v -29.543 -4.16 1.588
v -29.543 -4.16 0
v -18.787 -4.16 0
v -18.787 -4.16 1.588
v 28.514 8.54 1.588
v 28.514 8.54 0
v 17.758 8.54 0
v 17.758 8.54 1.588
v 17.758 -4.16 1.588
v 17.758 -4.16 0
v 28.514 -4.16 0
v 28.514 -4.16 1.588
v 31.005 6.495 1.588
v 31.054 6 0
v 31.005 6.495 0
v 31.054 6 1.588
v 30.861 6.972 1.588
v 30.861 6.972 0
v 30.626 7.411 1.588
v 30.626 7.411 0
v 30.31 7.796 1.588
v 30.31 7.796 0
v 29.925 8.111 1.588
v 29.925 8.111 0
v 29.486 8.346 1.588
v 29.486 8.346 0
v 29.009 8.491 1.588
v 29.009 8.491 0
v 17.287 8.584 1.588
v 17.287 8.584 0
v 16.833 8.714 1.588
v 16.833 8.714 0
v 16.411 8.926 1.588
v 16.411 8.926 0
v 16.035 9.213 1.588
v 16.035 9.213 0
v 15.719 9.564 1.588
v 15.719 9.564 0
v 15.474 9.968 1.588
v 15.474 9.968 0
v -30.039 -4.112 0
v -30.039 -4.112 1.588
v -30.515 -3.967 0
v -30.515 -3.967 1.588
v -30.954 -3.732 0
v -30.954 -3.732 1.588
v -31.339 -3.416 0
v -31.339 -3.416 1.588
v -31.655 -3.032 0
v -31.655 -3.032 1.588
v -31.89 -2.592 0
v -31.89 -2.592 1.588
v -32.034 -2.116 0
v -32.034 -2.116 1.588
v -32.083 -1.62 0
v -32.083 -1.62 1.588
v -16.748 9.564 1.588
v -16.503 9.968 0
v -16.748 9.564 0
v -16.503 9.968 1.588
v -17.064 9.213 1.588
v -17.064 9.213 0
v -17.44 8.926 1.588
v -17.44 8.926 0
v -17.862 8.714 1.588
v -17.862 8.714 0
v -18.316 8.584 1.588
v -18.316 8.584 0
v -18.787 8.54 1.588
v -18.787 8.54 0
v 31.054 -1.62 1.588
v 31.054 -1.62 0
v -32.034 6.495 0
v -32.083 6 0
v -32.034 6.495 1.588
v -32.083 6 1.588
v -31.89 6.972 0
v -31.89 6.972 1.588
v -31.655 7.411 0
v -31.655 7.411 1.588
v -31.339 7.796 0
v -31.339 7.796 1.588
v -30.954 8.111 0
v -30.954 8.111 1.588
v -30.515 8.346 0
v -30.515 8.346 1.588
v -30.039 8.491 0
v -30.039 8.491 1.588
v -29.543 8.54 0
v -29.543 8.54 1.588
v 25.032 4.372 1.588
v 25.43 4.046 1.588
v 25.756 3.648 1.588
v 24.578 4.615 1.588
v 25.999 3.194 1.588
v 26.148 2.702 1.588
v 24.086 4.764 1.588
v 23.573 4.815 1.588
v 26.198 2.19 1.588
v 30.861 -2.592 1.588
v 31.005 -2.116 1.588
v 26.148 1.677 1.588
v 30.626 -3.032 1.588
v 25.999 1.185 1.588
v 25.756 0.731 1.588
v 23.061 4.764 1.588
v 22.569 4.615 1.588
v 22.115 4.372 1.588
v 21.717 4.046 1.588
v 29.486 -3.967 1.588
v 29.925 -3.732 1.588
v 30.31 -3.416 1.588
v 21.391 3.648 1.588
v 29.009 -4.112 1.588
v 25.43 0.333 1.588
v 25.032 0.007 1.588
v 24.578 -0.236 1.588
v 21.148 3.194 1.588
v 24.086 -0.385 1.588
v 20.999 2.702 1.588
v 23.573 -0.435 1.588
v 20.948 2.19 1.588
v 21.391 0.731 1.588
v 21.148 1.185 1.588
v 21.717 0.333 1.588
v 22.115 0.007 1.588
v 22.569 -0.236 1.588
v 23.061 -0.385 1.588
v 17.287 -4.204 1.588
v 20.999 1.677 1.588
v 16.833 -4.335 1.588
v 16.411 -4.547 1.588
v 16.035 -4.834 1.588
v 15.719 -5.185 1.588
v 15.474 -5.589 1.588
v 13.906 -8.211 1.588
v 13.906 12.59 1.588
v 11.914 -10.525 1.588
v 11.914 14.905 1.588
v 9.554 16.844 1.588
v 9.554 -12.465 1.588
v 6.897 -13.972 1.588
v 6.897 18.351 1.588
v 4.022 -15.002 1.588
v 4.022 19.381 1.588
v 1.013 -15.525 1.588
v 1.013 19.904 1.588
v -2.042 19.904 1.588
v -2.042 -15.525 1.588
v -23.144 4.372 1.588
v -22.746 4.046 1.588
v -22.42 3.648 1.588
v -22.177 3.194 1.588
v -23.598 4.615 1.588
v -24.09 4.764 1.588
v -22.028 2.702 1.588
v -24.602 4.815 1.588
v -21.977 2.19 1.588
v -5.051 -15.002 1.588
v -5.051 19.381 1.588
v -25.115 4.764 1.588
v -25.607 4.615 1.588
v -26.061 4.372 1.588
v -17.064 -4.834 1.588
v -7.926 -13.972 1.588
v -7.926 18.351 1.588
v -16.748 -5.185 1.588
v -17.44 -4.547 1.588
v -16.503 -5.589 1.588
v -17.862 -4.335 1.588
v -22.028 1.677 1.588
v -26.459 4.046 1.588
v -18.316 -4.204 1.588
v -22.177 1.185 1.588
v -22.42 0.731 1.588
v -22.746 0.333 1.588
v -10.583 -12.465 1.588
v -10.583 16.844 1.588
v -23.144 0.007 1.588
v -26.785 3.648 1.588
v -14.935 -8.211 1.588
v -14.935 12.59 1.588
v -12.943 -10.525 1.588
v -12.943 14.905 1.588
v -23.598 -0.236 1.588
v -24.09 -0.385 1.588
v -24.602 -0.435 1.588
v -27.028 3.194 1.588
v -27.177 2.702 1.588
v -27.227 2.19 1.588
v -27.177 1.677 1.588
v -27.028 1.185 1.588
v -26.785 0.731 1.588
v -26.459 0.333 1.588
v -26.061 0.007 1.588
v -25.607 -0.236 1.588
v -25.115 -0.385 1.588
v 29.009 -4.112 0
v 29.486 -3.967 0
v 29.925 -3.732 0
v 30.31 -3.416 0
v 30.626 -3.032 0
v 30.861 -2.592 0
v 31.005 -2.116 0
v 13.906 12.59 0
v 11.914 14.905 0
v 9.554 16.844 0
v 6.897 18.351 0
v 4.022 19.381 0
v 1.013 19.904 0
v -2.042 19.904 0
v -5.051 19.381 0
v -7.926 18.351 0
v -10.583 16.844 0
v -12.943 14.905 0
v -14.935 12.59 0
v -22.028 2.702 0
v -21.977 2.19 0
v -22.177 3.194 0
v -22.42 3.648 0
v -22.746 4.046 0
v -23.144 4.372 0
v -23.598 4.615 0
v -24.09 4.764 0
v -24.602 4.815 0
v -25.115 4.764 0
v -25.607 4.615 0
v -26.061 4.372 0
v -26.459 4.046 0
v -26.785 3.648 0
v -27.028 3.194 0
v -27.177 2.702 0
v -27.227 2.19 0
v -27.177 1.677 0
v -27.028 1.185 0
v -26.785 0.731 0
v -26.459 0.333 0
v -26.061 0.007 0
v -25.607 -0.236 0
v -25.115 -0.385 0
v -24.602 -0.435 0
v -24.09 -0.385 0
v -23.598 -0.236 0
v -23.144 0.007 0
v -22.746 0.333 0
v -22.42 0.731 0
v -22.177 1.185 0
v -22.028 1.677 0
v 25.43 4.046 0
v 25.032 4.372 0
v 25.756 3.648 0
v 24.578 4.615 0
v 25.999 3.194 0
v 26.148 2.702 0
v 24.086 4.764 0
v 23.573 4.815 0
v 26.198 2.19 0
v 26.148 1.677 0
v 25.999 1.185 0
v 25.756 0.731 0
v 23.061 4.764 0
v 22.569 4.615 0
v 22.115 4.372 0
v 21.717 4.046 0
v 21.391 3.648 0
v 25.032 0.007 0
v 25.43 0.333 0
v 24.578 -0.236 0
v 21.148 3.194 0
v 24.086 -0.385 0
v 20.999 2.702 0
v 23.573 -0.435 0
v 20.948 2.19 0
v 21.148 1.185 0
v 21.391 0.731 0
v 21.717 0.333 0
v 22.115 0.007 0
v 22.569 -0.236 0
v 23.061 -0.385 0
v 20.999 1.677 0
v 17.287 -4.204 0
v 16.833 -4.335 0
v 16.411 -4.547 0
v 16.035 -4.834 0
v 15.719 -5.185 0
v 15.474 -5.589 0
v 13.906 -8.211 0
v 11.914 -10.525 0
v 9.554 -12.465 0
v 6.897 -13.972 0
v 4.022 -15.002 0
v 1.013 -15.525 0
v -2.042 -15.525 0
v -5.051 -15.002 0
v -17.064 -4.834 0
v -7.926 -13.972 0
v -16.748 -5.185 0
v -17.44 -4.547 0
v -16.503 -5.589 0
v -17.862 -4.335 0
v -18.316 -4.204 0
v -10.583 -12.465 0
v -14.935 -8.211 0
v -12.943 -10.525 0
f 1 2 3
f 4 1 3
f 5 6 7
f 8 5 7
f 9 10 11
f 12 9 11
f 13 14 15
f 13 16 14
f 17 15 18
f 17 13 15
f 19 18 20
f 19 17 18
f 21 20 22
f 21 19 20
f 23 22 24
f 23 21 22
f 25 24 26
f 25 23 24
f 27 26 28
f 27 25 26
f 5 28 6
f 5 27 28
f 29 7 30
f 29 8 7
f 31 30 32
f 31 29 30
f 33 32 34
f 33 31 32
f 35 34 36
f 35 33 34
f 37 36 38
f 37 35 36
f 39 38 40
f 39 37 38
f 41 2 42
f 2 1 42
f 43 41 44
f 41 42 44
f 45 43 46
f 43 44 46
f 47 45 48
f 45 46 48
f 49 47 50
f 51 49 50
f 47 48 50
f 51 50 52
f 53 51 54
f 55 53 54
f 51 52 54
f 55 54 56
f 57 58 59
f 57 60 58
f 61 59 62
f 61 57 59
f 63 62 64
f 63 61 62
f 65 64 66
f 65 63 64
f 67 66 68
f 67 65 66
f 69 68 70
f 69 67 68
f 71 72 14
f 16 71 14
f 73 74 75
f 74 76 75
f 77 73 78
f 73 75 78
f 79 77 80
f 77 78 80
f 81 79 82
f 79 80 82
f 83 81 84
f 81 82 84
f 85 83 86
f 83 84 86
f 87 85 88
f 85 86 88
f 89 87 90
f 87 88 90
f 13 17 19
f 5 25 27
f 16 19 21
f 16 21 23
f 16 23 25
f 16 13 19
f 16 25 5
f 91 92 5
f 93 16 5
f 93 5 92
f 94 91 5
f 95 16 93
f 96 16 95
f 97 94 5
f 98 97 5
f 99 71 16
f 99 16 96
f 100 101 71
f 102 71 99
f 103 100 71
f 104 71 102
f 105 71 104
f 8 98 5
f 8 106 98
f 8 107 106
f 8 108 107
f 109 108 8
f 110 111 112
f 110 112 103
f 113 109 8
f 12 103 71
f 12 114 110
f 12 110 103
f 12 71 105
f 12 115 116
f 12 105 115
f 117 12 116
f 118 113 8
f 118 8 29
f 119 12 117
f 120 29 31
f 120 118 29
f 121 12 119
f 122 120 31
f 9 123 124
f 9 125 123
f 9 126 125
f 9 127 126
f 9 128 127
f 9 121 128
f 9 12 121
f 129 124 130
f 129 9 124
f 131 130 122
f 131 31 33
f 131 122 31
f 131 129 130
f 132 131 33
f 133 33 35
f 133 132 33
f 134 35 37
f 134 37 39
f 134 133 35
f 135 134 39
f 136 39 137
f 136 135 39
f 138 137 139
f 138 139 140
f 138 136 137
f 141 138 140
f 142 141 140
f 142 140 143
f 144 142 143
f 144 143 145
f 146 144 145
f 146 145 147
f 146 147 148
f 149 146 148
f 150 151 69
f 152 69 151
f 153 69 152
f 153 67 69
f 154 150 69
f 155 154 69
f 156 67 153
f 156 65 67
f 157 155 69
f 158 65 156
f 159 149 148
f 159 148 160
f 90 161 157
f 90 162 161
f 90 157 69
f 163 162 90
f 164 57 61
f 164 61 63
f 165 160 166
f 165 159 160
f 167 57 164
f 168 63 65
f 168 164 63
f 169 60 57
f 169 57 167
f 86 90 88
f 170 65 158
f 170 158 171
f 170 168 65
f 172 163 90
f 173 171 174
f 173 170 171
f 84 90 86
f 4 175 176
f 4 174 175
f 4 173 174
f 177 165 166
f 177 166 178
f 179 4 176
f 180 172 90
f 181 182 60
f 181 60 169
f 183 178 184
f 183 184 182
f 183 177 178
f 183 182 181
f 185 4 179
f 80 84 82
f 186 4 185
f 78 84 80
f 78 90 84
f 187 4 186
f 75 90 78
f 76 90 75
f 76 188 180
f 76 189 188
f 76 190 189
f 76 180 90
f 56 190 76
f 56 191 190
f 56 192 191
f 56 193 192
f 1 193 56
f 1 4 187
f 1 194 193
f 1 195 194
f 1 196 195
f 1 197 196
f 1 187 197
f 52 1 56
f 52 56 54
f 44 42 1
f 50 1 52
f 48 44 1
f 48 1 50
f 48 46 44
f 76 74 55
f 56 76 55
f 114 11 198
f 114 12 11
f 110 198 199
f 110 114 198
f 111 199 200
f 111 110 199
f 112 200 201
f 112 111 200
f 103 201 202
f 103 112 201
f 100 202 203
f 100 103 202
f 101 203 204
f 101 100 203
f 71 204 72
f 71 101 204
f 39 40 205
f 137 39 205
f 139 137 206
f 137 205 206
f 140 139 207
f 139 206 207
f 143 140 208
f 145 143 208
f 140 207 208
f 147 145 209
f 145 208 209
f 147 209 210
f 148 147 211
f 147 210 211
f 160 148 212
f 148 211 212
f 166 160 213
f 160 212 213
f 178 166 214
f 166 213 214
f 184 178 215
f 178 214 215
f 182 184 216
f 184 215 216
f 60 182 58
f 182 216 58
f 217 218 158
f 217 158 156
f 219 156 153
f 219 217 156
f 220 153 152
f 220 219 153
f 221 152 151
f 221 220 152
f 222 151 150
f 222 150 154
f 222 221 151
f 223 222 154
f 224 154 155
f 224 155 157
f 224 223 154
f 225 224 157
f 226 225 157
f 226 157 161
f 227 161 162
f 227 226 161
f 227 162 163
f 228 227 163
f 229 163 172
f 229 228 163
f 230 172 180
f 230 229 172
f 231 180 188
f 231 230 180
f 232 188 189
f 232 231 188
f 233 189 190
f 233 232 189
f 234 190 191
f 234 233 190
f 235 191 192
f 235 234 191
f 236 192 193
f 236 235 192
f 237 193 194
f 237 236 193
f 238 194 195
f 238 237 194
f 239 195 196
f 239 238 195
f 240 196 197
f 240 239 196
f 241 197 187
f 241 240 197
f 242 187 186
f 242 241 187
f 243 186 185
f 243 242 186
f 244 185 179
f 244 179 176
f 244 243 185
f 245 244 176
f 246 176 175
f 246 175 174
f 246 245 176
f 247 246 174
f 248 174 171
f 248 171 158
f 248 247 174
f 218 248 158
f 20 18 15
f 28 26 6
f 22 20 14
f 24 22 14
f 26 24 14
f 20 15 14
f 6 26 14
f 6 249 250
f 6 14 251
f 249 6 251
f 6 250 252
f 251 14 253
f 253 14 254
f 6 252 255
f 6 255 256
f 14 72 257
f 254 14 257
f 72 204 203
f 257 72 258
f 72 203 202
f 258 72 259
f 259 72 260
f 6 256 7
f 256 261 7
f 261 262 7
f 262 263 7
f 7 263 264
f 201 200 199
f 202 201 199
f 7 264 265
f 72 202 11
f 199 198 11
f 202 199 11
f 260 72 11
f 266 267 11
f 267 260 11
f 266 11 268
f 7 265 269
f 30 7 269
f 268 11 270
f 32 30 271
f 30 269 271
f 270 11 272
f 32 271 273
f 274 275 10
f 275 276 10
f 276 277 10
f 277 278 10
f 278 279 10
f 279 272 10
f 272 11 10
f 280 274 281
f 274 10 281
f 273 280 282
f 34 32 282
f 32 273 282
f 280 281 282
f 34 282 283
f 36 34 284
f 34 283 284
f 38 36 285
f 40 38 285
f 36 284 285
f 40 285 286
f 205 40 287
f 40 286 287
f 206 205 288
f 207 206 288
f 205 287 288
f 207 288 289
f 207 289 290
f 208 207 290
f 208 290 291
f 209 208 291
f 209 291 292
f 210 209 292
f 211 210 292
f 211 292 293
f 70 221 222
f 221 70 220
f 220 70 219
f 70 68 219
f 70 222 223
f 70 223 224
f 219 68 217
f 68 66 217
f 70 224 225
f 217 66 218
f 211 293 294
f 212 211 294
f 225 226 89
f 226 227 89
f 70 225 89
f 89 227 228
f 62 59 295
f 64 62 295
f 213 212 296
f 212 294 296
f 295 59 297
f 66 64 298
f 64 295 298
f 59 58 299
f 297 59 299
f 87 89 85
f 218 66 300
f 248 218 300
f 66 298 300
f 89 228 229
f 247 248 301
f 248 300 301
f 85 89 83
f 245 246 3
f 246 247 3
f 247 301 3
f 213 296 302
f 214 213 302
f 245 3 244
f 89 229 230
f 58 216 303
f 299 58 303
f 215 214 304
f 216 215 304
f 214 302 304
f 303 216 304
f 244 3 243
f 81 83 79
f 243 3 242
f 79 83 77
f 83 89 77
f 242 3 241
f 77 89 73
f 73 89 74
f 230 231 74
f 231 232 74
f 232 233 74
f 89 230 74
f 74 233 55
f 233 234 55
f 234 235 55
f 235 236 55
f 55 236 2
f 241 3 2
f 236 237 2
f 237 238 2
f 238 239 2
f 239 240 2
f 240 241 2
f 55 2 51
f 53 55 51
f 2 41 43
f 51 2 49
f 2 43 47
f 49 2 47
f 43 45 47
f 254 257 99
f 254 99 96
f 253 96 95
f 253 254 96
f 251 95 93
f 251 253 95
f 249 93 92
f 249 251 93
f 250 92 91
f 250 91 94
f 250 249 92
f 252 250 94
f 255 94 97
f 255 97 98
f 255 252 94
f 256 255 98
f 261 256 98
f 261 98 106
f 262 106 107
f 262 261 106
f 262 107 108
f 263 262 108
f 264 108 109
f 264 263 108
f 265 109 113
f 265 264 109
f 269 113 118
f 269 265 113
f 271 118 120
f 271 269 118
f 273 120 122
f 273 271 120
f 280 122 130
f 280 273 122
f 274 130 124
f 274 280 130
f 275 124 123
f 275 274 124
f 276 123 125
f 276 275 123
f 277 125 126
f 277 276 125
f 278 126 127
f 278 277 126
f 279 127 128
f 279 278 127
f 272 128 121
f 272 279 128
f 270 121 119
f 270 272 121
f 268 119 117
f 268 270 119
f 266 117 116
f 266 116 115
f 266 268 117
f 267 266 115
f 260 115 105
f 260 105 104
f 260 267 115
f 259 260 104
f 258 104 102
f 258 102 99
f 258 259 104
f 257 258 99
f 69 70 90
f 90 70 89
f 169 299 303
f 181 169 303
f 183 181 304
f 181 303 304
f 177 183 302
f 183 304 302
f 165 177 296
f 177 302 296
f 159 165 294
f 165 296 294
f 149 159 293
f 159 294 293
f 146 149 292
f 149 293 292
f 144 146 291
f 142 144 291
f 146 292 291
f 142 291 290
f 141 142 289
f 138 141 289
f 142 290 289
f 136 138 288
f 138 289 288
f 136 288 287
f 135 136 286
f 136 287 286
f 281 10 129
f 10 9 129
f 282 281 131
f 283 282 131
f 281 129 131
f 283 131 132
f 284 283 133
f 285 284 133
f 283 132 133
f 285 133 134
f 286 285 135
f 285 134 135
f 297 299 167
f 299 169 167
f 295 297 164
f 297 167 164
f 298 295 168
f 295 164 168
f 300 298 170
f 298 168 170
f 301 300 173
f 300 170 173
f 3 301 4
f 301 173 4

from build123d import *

# Parameters (mm, degrees)
SKETCH1_R           = 2.625
BOSS_EXTRUDE1_DEPTH = 1.5875
FILLET1_R           = 2.54


with BuildPart() as part:
    # Sketch1 → Boss-Extrude1 (new body)
    with BuildSketch(Plane(origin=(0, 0, 0), x_dir=(-1, 0, 0), z_dir=(0, 0, 1))):
        with BuildLine():
            Line((-16.092859192, 4.160440607), (-31.053947254, 4.160440607))
            Line((-31.053947254, 4.160440607), (-31.053947254, -8.539559393))
            Line((-31.053947254, -8.539559393), (-16.092859192, -8.539559393))
            ThreePointArc((-16.092859192, -8.539559393), (0.514545783, -19.969559393), (17.121950758, -8.539559393))
            Line((17.121950758, -8.539559393), (32.08303882, -8.539559393))
            Line((32.08303882, -8.539559393), (32.08303882, 4.160440607))
            Line((32.08303882, 4.160440607), (17.121950758, 4.160440607))
            ThreePointArc((17.121950758, 4.160440607), (0.514545783, 15.590440607), (-16.092859192, 4.160440607))
        make_face()
        with Locations(Location((-23.573403223, -2.189559393, 0), (0, 0, 180))):
            Circle(SKETCH1_R, mode=Mode.SUBTRACT)
        with Locations(Location((24.602494789, -2.189559393, 0), (0, 0, 180))):
            Circle(SKETCH1_R, mode=Mode.SUBTRACT)
    extrude(amount=BOSS_EXTRUDE1_DEPTH)

    # Fillet1
    fillet1_edges = [part.edges().sort_by_distance(p)[0] for p in [
        (-17.121950758, -4.160440607, 0.79375),
        (-32.08303882, -4.160440607, 0.79375),
        (-32.08303882, 8.539559393, 0.79375),
        (-17.121950758, 8.539559393, 0.79375),
        (16.092859192, 8.539559393, 0.79375),
        (31.053947254, 8.539559393, 0.79375),
        (31.053947254, -4.160440607, 0.79375),
        (16.092859192, -4.160440607, 0.79375),
    ]]
    fillet(fillet1_edges, radius=FILLET1_R)


solid = part.part
